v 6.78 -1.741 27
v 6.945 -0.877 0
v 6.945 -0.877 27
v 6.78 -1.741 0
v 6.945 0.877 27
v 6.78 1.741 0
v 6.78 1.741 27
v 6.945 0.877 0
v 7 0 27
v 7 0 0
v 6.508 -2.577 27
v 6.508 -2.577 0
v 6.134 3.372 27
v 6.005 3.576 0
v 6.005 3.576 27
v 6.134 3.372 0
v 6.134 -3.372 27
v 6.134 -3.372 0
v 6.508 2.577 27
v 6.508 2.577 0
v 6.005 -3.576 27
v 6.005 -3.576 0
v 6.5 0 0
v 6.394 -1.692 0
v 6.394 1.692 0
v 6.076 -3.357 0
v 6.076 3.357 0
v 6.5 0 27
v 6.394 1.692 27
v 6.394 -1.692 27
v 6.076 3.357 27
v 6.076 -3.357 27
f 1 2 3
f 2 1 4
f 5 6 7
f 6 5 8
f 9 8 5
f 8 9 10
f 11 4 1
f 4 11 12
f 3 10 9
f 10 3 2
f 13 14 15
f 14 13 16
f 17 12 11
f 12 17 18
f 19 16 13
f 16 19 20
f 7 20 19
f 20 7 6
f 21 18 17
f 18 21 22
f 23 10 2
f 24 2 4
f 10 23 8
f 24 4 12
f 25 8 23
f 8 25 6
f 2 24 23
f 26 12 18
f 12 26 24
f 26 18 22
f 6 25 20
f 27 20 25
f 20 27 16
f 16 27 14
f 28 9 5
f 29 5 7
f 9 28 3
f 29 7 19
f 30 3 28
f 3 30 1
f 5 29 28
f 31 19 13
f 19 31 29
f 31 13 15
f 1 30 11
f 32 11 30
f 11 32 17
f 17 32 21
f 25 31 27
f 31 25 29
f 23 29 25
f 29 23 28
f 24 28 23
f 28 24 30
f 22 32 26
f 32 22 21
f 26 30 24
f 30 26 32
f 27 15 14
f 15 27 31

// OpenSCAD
$fn = 50;


difference() {
	union() {
		cylinder(h = 27, r = 7.0000000000);
		translate(v = [-10.0000000000, 0, 0]) {
			cylinder(h = 27, r = 7.0000000000);
		}
	}
	union() {
		cylinder(h = 27, r = 3.2500000000);
		cylinder(h = 27, r = 1.8000000000);
		cylinder(h = 27, r = 1.8000000000);
		cylinder(h = 27, r = 1.8000000000);
		translate(v = [-14.5000000000, 0, 0]) {
			hull() {
				translate(v = [-3.7500000000, 0.0000000000, 0]) {
					cylinder(h = 27, r = 10.5000000000);
				}
				translate(v = [3.7500000000, 0.0000000000, 0]) {
					cylinder(h = 27, r = 10.5000000000);
				}
				translate(v = [-3.7500000000, -0.0000000000, 0]) {
					cylinder(h = 27, r = 10.5000000000);
				}
				translate(v = [3.7500000000, -0.0000000000, 0]) {
					cylinder(h = 27, r = 10.5000000000);
				}
			}
		}
		translate(v = [-7.0000000000, 0, 0.0000000000]) {
			cylinder(h = 27, r = 13.5000000000);
		}
	}
}
